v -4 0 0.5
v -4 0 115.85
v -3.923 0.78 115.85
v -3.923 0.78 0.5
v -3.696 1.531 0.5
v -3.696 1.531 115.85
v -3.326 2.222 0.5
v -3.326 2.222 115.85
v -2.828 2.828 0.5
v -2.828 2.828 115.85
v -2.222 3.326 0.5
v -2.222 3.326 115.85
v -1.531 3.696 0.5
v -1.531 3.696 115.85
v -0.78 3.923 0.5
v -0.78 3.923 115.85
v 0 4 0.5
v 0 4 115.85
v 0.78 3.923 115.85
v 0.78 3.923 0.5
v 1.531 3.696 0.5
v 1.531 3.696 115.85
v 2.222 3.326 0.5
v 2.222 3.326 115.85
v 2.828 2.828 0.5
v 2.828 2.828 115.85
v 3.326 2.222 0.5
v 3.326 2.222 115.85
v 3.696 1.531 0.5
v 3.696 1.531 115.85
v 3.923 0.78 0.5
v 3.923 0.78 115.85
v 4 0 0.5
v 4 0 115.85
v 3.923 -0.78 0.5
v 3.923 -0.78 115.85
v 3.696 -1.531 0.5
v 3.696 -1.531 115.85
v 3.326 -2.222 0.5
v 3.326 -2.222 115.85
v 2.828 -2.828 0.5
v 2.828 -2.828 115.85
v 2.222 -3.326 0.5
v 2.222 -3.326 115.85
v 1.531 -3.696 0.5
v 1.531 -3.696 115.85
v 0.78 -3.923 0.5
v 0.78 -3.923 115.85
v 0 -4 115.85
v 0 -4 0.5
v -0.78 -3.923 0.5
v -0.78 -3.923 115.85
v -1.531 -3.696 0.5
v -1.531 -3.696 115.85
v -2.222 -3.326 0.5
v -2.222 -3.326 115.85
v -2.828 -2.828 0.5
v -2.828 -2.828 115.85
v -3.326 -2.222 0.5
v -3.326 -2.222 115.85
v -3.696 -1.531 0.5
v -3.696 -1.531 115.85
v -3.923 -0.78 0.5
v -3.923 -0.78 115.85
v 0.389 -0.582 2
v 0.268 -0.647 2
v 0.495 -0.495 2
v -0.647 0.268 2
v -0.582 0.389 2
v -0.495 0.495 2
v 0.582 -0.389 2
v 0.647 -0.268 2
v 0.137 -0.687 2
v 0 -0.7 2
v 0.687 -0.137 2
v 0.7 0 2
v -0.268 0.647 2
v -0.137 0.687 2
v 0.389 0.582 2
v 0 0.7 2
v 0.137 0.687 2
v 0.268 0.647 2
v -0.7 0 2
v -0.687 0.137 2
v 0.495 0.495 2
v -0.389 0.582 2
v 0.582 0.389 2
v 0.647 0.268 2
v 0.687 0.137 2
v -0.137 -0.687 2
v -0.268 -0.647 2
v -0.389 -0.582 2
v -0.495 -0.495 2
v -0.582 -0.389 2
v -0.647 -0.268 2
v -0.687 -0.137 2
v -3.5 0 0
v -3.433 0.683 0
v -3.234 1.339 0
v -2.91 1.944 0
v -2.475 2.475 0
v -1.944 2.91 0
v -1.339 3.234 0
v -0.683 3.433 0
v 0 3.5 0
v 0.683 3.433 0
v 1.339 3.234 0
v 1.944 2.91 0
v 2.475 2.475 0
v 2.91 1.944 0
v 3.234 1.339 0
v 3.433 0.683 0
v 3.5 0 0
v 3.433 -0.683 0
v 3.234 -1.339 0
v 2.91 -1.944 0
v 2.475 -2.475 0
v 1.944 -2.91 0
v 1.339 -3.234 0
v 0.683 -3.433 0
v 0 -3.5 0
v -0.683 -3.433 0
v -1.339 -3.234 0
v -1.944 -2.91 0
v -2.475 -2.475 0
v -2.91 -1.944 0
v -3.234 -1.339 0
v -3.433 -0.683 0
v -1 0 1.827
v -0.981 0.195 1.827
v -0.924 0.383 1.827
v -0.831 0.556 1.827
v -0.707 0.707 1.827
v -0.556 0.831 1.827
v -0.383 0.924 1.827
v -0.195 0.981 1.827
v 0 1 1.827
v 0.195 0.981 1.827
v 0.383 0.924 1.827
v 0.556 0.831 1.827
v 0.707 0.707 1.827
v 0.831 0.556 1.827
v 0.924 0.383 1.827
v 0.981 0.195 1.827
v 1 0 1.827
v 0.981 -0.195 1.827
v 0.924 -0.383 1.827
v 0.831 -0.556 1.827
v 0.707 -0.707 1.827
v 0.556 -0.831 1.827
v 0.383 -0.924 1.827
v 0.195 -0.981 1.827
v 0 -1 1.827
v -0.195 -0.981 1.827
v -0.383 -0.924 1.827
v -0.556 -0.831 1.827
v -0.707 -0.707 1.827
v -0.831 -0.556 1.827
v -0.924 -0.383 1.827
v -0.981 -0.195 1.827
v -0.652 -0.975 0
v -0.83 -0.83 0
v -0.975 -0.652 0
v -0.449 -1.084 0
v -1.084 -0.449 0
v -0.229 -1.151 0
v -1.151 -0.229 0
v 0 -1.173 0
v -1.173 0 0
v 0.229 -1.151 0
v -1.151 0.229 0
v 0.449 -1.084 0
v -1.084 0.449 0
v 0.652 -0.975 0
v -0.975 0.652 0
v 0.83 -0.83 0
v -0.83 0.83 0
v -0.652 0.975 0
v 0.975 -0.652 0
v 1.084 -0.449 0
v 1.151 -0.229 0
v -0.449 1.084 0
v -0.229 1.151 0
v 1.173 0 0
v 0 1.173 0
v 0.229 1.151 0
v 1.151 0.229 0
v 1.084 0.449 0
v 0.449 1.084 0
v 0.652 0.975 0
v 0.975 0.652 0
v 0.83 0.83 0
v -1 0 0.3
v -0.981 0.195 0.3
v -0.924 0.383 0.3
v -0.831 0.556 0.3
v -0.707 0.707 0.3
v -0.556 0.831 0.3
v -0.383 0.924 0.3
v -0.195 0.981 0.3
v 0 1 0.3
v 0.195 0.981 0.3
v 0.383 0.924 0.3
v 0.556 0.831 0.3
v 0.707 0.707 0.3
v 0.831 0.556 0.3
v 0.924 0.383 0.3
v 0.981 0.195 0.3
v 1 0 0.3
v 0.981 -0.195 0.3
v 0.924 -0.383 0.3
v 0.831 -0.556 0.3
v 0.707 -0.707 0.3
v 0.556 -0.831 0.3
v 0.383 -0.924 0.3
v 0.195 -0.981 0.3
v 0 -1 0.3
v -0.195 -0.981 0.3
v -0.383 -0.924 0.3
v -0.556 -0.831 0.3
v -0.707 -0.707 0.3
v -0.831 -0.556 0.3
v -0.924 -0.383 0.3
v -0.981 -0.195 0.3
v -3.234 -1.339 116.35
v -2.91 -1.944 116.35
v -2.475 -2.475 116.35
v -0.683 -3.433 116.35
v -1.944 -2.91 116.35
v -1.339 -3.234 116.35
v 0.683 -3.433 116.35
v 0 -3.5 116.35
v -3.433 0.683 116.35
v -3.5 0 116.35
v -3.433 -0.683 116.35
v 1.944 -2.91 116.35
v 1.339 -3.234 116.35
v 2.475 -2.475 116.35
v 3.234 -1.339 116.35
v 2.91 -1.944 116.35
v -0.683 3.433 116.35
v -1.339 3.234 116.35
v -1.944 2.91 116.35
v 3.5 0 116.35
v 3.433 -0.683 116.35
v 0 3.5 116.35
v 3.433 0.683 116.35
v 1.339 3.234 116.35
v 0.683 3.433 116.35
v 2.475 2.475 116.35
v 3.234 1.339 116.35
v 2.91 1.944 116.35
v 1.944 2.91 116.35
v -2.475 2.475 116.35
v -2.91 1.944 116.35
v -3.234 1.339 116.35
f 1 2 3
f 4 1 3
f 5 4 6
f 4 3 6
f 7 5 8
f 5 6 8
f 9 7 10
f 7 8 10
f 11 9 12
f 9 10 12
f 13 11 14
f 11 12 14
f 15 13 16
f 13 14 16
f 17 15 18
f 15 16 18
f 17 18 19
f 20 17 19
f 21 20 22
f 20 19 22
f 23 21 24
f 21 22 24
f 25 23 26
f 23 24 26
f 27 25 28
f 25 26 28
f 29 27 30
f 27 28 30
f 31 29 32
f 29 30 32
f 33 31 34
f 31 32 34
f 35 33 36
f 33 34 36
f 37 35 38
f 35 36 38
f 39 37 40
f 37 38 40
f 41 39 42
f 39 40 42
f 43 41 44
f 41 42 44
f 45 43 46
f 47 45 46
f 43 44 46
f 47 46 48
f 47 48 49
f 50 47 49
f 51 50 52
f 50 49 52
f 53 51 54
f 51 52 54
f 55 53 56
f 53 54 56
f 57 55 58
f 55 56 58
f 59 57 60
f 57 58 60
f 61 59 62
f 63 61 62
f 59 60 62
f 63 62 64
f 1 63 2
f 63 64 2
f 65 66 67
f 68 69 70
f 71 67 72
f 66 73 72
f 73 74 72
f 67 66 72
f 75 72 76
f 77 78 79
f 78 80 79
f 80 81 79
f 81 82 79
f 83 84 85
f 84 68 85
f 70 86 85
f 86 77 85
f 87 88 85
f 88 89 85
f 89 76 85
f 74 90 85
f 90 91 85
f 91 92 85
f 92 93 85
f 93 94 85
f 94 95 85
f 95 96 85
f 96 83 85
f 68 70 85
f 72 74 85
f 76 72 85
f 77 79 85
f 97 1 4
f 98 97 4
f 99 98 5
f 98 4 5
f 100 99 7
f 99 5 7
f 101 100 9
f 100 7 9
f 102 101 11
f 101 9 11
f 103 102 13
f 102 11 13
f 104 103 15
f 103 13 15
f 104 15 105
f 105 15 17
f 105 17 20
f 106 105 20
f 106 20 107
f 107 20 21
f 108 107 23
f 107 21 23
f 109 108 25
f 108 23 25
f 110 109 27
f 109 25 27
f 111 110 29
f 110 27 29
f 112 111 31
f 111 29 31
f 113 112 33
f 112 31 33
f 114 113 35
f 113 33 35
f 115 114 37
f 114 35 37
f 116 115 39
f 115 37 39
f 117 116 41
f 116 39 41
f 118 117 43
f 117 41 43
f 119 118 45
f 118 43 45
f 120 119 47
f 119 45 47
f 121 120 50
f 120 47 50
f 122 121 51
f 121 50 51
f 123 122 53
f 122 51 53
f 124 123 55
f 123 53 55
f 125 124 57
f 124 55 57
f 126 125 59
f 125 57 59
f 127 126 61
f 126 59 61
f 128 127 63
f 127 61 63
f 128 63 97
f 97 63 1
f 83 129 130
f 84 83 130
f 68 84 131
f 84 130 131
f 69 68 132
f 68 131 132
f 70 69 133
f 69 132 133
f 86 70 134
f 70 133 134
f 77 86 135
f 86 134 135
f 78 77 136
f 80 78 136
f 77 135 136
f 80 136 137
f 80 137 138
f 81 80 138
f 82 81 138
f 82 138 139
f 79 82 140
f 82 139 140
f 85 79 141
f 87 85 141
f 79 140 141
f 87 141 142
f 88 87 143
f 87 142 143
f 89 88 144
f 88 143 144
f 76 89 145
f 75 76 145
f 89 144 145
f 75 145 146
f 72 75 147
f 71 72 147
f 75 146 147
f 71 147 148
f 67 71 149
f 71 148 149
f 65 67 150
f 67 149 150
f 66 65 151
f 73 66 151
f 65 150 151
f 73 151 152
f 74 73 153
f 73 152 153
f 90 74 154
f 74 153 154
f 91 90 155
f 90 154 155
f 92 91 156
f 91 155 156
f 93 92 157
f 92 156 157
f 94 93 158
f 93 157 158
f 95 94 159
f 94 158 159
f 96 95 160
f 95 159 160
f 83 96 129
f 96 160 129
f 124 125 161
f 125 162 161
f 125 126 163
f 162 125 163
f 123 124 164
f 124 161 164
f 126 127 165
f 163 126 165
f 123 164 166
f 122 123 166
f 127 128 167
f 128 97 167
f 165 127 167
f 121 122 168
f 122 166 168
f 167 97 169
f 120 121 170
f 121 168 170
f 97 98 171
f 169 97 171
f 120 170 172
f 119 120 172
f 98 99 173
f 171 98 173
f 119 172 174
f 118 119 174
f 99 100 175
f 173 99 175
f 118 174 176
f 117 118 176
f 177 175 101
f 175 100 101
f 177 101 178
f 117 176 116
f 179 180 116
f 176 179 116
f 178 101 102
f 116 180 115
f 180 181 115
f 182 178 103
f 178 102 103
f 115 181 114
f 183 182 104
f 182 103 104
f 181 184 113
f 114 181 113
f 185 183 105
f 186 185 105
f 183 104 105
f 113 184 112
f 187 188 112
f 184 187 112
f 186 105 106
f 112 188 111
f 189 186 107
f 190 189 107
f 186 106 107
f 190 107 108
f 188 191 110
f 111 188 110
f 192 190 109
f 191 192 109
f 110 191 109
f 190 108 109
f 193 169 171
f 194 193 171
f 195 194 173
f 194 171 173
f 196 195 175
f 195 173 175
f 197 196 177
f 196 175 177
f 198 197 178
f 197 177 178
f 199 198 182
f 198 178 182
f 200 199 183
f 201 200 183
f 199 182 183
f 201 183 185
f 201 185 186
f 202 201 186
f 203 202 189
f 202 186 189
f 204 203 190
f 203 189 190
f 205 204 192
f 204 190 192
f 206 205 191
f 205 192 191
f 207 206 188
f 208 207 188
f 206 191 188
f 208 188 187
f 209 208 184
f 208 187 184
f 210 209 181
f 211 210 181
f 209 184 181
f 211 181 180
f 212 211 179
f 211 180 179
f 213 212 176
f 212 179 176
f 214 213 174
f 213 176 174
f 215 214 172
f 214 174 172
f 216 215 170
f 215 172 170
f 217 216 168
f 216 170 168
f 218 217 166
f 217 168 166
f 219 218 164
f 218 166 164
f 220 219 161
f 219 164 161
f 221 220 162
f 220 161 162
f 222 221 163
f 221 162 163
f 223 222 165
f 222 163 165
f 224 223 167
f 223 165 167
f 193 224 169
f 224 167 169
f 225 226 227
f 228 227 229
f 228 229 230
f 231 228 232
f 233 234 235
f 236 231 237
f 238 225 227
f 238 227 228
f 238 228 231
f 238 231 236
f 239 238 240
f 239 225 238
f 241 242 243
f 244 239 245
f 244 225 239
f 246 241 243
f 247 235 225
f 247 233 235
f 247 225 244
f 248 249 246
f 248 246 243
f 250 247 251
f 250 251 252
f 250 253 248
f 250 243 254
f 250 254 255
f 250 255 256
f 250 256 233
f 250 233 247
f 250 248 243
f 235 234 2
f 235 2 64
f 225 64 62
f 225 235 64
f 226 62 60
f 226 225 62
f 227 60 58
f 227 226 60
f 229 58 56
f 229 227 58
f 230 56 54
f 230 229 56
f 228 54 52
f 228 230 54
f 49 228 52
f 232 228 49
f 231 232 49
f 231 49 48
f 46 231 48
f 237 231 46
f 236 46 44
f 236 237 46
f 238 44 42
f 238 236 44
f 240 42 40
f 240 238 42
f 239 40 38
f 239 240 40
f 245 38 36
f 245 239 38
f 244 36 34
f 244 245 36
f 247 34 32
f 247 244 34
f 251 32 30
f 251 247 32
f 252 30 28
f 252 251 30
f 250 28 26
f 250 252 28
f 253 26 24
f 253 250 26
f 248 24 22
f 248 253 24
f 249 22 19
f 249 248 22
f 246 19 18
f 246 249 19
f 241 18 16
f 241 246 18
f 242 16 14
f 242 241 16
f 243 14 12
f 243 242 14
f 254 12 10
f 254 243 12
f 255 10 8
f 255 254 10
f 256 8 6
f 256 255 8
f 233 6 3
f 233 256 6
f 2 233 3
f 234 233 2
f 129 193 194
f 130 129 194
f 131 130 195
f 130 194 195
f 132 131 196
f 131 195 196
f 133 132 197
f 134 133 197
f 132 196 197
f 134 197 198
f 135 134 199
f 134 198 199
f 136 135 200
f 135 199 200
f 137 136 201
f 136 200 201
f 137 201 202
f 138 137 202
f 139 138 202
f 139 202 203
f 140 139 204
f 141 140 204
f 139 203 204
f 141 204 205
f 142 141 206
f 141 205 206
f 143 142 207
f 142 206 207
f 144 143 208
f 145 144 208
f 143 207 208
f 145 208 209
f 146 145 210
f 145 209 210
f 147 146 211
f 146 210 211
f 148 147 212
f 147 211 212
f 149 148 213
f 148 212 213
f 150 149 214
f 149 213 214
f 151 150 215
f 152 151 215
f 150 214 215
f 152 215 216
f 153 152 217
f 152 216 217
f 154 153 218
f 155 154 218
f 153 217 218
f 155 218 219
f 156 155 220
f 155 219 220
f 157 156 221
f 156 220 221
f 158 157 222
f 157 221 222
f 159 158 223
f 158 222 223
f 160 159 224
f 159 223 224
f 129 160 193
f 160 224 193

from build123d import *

# Parameters (mm, degrees)
CHAMFER1_SIZE         = 0.5
CHAMFER2_SIZE         = 0.3
CHAMFER2_SIZE2        = 0.173205081
CHAMFER2_PART_2_SIZE  = 0.3
CHAMFER2_PART_2_SIZE2 = 0.173205081
CHAMFER2_PART_3_SIZE  = 0.3
CHAMFER2_PART_3_SIZE2 = 0.173205081
CHAMFER2_PART_4_SIZE  = 0.3
CHAMFER2_PART_4_SIZE2 = 0.173205081
SKETCH2_W             = 23.197150539
SKETCH2_H             = 11.802059046
CUT_EXTRUDE1_DEPTH    = 50
CHAMFER3_SIZE         = 0.5


with BuildPart() as part:
    # Sketch1 → Revolve1 (revolve)
    with BuildSketch(Plane(origin=(0, 0, 0), x_dir=(1, 0, 0), z_dir=(0, 1, 0))):
        Polygon((-1, 0), (-4, 0), (-4, -121), (-1, -121), (-1, -119), (0, -119), (0, -2), (-1, -2), align=None)
    revolve(axis=Axis((0, 0, 119), (0, 0, -1)))

    # Chamfer1
    chamfer1_edges = [part.edges().sort_by_distance(p)[0] for p in [
        (4, 0, 121),
        (4, 0, 0),
    ]]
    chamfer(chamfer1_edges, length=CHAMFER1_SIZE)

    # Chamfer2
    chamfer2_edges = [part.edges().sort_by_distance(p)[0] for p in [
        (1, 0, 2),
    ]]
    chamfer2_side = [part.faces().sort_by_distance(p)[0] for p in [
        (0, 0, 2),
    ]]
    chamfer(chamfer2_edges, length=CHAMFER2_SIZE, length2=CHAMFER2_SIZE2, reference=chamfer2_side[0])

    # Chamfer2 part 2
    chamfer2_part_2_edges = [part.edges().sort_by_distance(p)[0] for p in [
        (1, 0, 119),
    ]]
    chamfer2_part_2_side = [part.faces().sort_by_distance(p)[0] for p in [
        (1, 0, 120),
    ]]
    chamfer(chamfer2_part_2_edges, length=CHAMFER2_PART_2_SIZE, length2=CHAMFER2_PART_2_SIZE2, reference=chamfer2_part_2_side[0])

    # Chamfer2 part 3
    chamfer2_part_3_edges = [part.edges().sort_by_distance(p)[0] for p in [
        (1, 0, 121),
    ]]
    chamfer2_part_3_side = [part.faces().sort_by_distance(p)[0] for p in [
        (3.401005051, 0, 121),
    ]]
    chamfer(chamfer2_part_3_edges, length=CHAMFER2_PART_3_SIZE, length2=CHAMFER2_PART_3_SIZE2, reference=chamfer2_part_3_side[0])

    # Chamfer2 part 4
    chamfer2_part_4_edges = [part.edges().sort_by_distance(p)[0] for p in [
        (1, 0, 0),
    ]]
    chamfer2_part_4_side = [part.faces().sort_by_distance(p)[0] for p in [
        (1, 0, 1),
    ]]
    chamfer(chamfer2_part_4_edges, length=CHAMFER2_PART_4_SIZE, length2=CHAMFER2_PART_4_SIZE2, reference=chamfer2_part_4_side[0])

    # Sketch2 → Cut-Extrude1 (cut)
    with BuildSketch(Plane(origin=(0, 28.2, 0), x_dir=(1, 0, 0), z_dir=(0, 1, 0))):
        with Locations((2.541571207, -122.251029523)):
            Rectangle(SKETCH2_W, SKETCH2_H)
    extrude(amount=-CUT_EXTRUDE1_DEPTH, mode=Mode.SUBTRACT)

    # Chamfer3
    chamfer3_edges = [part.edges().sort_by_distance(p)[0] for p in [
        (4, 0, 116.35),
    ]]
    chamfer(chamfer3_edges, length=CHAMFER3_SIZE)


solid = part.part
